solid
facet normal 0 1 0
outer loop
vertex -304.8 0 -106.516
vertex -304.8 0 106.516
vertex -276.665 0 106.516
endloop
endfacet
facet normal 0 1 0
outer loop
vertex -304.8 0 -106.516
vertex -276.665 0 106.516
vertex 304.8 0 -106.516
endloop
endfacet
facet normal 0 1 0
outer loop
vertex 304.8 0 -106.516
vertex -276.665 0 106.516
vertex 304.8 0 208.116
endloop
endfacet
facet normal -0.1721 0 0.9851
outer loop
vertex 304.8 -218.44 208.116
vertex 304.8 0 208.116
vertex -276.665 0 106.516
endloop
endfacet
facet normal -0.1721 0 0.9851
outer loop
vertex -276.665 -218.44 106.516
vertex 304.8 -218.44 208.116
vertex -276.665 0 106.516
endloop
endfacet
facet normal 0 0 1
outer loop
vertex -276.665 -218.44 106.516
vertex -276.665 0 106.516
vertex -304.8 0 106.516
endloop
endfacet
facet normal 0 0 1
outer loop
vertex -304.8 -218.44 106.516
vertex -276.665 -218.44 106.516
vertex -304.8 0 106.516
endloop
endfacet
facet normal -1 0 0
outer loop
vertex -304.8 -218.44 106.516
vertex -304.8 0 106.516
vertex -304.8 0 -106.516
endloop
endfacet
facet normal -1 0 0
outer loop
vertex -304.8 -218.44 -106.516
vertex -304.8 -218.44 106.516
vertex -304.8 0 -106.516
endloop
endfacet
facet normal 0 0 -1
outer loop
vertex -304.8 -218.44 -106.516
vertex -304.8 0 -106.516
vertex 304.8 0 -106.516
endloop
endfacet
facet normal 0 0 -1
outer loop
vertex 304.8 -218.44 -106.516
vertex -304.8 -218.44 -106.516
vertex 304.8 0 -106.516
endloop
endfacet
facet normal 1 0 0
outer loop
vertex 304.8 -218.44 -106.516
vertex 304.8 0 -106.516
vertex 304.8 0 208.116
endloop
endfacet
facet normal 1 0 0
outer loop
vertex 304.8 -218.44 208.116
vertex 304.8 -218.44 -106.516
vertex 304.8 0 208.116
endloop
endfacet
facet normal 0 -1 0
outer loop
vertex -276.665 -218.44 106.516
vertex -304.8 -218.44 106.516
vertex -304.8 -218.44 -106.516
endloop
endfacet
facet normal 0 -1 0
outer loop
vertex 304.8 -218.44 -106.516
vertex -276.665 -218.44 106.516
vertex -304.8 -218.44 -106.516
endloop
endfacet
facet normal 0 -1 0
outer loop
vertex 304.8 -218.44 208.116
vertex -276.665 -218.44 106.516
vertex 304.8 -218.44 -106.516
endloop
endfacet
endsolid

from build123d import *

# Parameters (mm, degrees)
F0_W     = 609.6
F0_H     = 4.916123
F0_H_2   = 203.2
F1_DEPTH = 218.44


with BuildPart() as f1:
    # F0 (on Front) → F1 (new body)
    with BuildSketch(Plane.XZ):
        with Locations((0, -104.058061)):
            Rectangle(F0_W, F0_H)
        Rectangle(F0_W, F0_H_2)
        Polygon((-304.8, 101.6), (304.8, 101.6), (304.8, 106.516123), (-276.664647, 106.516123), align=None)
        Polygon((-304.8, 106.516123), (-304.8, 101.6), (-276.664647, 106.516123), align=None)
        Polygon((-276.664647, 106.516123), (304.8, 106.516123), (304.8, 208.116123), align=None)
    extrude(amount=F1_DEPTH)


solid = f1.part
